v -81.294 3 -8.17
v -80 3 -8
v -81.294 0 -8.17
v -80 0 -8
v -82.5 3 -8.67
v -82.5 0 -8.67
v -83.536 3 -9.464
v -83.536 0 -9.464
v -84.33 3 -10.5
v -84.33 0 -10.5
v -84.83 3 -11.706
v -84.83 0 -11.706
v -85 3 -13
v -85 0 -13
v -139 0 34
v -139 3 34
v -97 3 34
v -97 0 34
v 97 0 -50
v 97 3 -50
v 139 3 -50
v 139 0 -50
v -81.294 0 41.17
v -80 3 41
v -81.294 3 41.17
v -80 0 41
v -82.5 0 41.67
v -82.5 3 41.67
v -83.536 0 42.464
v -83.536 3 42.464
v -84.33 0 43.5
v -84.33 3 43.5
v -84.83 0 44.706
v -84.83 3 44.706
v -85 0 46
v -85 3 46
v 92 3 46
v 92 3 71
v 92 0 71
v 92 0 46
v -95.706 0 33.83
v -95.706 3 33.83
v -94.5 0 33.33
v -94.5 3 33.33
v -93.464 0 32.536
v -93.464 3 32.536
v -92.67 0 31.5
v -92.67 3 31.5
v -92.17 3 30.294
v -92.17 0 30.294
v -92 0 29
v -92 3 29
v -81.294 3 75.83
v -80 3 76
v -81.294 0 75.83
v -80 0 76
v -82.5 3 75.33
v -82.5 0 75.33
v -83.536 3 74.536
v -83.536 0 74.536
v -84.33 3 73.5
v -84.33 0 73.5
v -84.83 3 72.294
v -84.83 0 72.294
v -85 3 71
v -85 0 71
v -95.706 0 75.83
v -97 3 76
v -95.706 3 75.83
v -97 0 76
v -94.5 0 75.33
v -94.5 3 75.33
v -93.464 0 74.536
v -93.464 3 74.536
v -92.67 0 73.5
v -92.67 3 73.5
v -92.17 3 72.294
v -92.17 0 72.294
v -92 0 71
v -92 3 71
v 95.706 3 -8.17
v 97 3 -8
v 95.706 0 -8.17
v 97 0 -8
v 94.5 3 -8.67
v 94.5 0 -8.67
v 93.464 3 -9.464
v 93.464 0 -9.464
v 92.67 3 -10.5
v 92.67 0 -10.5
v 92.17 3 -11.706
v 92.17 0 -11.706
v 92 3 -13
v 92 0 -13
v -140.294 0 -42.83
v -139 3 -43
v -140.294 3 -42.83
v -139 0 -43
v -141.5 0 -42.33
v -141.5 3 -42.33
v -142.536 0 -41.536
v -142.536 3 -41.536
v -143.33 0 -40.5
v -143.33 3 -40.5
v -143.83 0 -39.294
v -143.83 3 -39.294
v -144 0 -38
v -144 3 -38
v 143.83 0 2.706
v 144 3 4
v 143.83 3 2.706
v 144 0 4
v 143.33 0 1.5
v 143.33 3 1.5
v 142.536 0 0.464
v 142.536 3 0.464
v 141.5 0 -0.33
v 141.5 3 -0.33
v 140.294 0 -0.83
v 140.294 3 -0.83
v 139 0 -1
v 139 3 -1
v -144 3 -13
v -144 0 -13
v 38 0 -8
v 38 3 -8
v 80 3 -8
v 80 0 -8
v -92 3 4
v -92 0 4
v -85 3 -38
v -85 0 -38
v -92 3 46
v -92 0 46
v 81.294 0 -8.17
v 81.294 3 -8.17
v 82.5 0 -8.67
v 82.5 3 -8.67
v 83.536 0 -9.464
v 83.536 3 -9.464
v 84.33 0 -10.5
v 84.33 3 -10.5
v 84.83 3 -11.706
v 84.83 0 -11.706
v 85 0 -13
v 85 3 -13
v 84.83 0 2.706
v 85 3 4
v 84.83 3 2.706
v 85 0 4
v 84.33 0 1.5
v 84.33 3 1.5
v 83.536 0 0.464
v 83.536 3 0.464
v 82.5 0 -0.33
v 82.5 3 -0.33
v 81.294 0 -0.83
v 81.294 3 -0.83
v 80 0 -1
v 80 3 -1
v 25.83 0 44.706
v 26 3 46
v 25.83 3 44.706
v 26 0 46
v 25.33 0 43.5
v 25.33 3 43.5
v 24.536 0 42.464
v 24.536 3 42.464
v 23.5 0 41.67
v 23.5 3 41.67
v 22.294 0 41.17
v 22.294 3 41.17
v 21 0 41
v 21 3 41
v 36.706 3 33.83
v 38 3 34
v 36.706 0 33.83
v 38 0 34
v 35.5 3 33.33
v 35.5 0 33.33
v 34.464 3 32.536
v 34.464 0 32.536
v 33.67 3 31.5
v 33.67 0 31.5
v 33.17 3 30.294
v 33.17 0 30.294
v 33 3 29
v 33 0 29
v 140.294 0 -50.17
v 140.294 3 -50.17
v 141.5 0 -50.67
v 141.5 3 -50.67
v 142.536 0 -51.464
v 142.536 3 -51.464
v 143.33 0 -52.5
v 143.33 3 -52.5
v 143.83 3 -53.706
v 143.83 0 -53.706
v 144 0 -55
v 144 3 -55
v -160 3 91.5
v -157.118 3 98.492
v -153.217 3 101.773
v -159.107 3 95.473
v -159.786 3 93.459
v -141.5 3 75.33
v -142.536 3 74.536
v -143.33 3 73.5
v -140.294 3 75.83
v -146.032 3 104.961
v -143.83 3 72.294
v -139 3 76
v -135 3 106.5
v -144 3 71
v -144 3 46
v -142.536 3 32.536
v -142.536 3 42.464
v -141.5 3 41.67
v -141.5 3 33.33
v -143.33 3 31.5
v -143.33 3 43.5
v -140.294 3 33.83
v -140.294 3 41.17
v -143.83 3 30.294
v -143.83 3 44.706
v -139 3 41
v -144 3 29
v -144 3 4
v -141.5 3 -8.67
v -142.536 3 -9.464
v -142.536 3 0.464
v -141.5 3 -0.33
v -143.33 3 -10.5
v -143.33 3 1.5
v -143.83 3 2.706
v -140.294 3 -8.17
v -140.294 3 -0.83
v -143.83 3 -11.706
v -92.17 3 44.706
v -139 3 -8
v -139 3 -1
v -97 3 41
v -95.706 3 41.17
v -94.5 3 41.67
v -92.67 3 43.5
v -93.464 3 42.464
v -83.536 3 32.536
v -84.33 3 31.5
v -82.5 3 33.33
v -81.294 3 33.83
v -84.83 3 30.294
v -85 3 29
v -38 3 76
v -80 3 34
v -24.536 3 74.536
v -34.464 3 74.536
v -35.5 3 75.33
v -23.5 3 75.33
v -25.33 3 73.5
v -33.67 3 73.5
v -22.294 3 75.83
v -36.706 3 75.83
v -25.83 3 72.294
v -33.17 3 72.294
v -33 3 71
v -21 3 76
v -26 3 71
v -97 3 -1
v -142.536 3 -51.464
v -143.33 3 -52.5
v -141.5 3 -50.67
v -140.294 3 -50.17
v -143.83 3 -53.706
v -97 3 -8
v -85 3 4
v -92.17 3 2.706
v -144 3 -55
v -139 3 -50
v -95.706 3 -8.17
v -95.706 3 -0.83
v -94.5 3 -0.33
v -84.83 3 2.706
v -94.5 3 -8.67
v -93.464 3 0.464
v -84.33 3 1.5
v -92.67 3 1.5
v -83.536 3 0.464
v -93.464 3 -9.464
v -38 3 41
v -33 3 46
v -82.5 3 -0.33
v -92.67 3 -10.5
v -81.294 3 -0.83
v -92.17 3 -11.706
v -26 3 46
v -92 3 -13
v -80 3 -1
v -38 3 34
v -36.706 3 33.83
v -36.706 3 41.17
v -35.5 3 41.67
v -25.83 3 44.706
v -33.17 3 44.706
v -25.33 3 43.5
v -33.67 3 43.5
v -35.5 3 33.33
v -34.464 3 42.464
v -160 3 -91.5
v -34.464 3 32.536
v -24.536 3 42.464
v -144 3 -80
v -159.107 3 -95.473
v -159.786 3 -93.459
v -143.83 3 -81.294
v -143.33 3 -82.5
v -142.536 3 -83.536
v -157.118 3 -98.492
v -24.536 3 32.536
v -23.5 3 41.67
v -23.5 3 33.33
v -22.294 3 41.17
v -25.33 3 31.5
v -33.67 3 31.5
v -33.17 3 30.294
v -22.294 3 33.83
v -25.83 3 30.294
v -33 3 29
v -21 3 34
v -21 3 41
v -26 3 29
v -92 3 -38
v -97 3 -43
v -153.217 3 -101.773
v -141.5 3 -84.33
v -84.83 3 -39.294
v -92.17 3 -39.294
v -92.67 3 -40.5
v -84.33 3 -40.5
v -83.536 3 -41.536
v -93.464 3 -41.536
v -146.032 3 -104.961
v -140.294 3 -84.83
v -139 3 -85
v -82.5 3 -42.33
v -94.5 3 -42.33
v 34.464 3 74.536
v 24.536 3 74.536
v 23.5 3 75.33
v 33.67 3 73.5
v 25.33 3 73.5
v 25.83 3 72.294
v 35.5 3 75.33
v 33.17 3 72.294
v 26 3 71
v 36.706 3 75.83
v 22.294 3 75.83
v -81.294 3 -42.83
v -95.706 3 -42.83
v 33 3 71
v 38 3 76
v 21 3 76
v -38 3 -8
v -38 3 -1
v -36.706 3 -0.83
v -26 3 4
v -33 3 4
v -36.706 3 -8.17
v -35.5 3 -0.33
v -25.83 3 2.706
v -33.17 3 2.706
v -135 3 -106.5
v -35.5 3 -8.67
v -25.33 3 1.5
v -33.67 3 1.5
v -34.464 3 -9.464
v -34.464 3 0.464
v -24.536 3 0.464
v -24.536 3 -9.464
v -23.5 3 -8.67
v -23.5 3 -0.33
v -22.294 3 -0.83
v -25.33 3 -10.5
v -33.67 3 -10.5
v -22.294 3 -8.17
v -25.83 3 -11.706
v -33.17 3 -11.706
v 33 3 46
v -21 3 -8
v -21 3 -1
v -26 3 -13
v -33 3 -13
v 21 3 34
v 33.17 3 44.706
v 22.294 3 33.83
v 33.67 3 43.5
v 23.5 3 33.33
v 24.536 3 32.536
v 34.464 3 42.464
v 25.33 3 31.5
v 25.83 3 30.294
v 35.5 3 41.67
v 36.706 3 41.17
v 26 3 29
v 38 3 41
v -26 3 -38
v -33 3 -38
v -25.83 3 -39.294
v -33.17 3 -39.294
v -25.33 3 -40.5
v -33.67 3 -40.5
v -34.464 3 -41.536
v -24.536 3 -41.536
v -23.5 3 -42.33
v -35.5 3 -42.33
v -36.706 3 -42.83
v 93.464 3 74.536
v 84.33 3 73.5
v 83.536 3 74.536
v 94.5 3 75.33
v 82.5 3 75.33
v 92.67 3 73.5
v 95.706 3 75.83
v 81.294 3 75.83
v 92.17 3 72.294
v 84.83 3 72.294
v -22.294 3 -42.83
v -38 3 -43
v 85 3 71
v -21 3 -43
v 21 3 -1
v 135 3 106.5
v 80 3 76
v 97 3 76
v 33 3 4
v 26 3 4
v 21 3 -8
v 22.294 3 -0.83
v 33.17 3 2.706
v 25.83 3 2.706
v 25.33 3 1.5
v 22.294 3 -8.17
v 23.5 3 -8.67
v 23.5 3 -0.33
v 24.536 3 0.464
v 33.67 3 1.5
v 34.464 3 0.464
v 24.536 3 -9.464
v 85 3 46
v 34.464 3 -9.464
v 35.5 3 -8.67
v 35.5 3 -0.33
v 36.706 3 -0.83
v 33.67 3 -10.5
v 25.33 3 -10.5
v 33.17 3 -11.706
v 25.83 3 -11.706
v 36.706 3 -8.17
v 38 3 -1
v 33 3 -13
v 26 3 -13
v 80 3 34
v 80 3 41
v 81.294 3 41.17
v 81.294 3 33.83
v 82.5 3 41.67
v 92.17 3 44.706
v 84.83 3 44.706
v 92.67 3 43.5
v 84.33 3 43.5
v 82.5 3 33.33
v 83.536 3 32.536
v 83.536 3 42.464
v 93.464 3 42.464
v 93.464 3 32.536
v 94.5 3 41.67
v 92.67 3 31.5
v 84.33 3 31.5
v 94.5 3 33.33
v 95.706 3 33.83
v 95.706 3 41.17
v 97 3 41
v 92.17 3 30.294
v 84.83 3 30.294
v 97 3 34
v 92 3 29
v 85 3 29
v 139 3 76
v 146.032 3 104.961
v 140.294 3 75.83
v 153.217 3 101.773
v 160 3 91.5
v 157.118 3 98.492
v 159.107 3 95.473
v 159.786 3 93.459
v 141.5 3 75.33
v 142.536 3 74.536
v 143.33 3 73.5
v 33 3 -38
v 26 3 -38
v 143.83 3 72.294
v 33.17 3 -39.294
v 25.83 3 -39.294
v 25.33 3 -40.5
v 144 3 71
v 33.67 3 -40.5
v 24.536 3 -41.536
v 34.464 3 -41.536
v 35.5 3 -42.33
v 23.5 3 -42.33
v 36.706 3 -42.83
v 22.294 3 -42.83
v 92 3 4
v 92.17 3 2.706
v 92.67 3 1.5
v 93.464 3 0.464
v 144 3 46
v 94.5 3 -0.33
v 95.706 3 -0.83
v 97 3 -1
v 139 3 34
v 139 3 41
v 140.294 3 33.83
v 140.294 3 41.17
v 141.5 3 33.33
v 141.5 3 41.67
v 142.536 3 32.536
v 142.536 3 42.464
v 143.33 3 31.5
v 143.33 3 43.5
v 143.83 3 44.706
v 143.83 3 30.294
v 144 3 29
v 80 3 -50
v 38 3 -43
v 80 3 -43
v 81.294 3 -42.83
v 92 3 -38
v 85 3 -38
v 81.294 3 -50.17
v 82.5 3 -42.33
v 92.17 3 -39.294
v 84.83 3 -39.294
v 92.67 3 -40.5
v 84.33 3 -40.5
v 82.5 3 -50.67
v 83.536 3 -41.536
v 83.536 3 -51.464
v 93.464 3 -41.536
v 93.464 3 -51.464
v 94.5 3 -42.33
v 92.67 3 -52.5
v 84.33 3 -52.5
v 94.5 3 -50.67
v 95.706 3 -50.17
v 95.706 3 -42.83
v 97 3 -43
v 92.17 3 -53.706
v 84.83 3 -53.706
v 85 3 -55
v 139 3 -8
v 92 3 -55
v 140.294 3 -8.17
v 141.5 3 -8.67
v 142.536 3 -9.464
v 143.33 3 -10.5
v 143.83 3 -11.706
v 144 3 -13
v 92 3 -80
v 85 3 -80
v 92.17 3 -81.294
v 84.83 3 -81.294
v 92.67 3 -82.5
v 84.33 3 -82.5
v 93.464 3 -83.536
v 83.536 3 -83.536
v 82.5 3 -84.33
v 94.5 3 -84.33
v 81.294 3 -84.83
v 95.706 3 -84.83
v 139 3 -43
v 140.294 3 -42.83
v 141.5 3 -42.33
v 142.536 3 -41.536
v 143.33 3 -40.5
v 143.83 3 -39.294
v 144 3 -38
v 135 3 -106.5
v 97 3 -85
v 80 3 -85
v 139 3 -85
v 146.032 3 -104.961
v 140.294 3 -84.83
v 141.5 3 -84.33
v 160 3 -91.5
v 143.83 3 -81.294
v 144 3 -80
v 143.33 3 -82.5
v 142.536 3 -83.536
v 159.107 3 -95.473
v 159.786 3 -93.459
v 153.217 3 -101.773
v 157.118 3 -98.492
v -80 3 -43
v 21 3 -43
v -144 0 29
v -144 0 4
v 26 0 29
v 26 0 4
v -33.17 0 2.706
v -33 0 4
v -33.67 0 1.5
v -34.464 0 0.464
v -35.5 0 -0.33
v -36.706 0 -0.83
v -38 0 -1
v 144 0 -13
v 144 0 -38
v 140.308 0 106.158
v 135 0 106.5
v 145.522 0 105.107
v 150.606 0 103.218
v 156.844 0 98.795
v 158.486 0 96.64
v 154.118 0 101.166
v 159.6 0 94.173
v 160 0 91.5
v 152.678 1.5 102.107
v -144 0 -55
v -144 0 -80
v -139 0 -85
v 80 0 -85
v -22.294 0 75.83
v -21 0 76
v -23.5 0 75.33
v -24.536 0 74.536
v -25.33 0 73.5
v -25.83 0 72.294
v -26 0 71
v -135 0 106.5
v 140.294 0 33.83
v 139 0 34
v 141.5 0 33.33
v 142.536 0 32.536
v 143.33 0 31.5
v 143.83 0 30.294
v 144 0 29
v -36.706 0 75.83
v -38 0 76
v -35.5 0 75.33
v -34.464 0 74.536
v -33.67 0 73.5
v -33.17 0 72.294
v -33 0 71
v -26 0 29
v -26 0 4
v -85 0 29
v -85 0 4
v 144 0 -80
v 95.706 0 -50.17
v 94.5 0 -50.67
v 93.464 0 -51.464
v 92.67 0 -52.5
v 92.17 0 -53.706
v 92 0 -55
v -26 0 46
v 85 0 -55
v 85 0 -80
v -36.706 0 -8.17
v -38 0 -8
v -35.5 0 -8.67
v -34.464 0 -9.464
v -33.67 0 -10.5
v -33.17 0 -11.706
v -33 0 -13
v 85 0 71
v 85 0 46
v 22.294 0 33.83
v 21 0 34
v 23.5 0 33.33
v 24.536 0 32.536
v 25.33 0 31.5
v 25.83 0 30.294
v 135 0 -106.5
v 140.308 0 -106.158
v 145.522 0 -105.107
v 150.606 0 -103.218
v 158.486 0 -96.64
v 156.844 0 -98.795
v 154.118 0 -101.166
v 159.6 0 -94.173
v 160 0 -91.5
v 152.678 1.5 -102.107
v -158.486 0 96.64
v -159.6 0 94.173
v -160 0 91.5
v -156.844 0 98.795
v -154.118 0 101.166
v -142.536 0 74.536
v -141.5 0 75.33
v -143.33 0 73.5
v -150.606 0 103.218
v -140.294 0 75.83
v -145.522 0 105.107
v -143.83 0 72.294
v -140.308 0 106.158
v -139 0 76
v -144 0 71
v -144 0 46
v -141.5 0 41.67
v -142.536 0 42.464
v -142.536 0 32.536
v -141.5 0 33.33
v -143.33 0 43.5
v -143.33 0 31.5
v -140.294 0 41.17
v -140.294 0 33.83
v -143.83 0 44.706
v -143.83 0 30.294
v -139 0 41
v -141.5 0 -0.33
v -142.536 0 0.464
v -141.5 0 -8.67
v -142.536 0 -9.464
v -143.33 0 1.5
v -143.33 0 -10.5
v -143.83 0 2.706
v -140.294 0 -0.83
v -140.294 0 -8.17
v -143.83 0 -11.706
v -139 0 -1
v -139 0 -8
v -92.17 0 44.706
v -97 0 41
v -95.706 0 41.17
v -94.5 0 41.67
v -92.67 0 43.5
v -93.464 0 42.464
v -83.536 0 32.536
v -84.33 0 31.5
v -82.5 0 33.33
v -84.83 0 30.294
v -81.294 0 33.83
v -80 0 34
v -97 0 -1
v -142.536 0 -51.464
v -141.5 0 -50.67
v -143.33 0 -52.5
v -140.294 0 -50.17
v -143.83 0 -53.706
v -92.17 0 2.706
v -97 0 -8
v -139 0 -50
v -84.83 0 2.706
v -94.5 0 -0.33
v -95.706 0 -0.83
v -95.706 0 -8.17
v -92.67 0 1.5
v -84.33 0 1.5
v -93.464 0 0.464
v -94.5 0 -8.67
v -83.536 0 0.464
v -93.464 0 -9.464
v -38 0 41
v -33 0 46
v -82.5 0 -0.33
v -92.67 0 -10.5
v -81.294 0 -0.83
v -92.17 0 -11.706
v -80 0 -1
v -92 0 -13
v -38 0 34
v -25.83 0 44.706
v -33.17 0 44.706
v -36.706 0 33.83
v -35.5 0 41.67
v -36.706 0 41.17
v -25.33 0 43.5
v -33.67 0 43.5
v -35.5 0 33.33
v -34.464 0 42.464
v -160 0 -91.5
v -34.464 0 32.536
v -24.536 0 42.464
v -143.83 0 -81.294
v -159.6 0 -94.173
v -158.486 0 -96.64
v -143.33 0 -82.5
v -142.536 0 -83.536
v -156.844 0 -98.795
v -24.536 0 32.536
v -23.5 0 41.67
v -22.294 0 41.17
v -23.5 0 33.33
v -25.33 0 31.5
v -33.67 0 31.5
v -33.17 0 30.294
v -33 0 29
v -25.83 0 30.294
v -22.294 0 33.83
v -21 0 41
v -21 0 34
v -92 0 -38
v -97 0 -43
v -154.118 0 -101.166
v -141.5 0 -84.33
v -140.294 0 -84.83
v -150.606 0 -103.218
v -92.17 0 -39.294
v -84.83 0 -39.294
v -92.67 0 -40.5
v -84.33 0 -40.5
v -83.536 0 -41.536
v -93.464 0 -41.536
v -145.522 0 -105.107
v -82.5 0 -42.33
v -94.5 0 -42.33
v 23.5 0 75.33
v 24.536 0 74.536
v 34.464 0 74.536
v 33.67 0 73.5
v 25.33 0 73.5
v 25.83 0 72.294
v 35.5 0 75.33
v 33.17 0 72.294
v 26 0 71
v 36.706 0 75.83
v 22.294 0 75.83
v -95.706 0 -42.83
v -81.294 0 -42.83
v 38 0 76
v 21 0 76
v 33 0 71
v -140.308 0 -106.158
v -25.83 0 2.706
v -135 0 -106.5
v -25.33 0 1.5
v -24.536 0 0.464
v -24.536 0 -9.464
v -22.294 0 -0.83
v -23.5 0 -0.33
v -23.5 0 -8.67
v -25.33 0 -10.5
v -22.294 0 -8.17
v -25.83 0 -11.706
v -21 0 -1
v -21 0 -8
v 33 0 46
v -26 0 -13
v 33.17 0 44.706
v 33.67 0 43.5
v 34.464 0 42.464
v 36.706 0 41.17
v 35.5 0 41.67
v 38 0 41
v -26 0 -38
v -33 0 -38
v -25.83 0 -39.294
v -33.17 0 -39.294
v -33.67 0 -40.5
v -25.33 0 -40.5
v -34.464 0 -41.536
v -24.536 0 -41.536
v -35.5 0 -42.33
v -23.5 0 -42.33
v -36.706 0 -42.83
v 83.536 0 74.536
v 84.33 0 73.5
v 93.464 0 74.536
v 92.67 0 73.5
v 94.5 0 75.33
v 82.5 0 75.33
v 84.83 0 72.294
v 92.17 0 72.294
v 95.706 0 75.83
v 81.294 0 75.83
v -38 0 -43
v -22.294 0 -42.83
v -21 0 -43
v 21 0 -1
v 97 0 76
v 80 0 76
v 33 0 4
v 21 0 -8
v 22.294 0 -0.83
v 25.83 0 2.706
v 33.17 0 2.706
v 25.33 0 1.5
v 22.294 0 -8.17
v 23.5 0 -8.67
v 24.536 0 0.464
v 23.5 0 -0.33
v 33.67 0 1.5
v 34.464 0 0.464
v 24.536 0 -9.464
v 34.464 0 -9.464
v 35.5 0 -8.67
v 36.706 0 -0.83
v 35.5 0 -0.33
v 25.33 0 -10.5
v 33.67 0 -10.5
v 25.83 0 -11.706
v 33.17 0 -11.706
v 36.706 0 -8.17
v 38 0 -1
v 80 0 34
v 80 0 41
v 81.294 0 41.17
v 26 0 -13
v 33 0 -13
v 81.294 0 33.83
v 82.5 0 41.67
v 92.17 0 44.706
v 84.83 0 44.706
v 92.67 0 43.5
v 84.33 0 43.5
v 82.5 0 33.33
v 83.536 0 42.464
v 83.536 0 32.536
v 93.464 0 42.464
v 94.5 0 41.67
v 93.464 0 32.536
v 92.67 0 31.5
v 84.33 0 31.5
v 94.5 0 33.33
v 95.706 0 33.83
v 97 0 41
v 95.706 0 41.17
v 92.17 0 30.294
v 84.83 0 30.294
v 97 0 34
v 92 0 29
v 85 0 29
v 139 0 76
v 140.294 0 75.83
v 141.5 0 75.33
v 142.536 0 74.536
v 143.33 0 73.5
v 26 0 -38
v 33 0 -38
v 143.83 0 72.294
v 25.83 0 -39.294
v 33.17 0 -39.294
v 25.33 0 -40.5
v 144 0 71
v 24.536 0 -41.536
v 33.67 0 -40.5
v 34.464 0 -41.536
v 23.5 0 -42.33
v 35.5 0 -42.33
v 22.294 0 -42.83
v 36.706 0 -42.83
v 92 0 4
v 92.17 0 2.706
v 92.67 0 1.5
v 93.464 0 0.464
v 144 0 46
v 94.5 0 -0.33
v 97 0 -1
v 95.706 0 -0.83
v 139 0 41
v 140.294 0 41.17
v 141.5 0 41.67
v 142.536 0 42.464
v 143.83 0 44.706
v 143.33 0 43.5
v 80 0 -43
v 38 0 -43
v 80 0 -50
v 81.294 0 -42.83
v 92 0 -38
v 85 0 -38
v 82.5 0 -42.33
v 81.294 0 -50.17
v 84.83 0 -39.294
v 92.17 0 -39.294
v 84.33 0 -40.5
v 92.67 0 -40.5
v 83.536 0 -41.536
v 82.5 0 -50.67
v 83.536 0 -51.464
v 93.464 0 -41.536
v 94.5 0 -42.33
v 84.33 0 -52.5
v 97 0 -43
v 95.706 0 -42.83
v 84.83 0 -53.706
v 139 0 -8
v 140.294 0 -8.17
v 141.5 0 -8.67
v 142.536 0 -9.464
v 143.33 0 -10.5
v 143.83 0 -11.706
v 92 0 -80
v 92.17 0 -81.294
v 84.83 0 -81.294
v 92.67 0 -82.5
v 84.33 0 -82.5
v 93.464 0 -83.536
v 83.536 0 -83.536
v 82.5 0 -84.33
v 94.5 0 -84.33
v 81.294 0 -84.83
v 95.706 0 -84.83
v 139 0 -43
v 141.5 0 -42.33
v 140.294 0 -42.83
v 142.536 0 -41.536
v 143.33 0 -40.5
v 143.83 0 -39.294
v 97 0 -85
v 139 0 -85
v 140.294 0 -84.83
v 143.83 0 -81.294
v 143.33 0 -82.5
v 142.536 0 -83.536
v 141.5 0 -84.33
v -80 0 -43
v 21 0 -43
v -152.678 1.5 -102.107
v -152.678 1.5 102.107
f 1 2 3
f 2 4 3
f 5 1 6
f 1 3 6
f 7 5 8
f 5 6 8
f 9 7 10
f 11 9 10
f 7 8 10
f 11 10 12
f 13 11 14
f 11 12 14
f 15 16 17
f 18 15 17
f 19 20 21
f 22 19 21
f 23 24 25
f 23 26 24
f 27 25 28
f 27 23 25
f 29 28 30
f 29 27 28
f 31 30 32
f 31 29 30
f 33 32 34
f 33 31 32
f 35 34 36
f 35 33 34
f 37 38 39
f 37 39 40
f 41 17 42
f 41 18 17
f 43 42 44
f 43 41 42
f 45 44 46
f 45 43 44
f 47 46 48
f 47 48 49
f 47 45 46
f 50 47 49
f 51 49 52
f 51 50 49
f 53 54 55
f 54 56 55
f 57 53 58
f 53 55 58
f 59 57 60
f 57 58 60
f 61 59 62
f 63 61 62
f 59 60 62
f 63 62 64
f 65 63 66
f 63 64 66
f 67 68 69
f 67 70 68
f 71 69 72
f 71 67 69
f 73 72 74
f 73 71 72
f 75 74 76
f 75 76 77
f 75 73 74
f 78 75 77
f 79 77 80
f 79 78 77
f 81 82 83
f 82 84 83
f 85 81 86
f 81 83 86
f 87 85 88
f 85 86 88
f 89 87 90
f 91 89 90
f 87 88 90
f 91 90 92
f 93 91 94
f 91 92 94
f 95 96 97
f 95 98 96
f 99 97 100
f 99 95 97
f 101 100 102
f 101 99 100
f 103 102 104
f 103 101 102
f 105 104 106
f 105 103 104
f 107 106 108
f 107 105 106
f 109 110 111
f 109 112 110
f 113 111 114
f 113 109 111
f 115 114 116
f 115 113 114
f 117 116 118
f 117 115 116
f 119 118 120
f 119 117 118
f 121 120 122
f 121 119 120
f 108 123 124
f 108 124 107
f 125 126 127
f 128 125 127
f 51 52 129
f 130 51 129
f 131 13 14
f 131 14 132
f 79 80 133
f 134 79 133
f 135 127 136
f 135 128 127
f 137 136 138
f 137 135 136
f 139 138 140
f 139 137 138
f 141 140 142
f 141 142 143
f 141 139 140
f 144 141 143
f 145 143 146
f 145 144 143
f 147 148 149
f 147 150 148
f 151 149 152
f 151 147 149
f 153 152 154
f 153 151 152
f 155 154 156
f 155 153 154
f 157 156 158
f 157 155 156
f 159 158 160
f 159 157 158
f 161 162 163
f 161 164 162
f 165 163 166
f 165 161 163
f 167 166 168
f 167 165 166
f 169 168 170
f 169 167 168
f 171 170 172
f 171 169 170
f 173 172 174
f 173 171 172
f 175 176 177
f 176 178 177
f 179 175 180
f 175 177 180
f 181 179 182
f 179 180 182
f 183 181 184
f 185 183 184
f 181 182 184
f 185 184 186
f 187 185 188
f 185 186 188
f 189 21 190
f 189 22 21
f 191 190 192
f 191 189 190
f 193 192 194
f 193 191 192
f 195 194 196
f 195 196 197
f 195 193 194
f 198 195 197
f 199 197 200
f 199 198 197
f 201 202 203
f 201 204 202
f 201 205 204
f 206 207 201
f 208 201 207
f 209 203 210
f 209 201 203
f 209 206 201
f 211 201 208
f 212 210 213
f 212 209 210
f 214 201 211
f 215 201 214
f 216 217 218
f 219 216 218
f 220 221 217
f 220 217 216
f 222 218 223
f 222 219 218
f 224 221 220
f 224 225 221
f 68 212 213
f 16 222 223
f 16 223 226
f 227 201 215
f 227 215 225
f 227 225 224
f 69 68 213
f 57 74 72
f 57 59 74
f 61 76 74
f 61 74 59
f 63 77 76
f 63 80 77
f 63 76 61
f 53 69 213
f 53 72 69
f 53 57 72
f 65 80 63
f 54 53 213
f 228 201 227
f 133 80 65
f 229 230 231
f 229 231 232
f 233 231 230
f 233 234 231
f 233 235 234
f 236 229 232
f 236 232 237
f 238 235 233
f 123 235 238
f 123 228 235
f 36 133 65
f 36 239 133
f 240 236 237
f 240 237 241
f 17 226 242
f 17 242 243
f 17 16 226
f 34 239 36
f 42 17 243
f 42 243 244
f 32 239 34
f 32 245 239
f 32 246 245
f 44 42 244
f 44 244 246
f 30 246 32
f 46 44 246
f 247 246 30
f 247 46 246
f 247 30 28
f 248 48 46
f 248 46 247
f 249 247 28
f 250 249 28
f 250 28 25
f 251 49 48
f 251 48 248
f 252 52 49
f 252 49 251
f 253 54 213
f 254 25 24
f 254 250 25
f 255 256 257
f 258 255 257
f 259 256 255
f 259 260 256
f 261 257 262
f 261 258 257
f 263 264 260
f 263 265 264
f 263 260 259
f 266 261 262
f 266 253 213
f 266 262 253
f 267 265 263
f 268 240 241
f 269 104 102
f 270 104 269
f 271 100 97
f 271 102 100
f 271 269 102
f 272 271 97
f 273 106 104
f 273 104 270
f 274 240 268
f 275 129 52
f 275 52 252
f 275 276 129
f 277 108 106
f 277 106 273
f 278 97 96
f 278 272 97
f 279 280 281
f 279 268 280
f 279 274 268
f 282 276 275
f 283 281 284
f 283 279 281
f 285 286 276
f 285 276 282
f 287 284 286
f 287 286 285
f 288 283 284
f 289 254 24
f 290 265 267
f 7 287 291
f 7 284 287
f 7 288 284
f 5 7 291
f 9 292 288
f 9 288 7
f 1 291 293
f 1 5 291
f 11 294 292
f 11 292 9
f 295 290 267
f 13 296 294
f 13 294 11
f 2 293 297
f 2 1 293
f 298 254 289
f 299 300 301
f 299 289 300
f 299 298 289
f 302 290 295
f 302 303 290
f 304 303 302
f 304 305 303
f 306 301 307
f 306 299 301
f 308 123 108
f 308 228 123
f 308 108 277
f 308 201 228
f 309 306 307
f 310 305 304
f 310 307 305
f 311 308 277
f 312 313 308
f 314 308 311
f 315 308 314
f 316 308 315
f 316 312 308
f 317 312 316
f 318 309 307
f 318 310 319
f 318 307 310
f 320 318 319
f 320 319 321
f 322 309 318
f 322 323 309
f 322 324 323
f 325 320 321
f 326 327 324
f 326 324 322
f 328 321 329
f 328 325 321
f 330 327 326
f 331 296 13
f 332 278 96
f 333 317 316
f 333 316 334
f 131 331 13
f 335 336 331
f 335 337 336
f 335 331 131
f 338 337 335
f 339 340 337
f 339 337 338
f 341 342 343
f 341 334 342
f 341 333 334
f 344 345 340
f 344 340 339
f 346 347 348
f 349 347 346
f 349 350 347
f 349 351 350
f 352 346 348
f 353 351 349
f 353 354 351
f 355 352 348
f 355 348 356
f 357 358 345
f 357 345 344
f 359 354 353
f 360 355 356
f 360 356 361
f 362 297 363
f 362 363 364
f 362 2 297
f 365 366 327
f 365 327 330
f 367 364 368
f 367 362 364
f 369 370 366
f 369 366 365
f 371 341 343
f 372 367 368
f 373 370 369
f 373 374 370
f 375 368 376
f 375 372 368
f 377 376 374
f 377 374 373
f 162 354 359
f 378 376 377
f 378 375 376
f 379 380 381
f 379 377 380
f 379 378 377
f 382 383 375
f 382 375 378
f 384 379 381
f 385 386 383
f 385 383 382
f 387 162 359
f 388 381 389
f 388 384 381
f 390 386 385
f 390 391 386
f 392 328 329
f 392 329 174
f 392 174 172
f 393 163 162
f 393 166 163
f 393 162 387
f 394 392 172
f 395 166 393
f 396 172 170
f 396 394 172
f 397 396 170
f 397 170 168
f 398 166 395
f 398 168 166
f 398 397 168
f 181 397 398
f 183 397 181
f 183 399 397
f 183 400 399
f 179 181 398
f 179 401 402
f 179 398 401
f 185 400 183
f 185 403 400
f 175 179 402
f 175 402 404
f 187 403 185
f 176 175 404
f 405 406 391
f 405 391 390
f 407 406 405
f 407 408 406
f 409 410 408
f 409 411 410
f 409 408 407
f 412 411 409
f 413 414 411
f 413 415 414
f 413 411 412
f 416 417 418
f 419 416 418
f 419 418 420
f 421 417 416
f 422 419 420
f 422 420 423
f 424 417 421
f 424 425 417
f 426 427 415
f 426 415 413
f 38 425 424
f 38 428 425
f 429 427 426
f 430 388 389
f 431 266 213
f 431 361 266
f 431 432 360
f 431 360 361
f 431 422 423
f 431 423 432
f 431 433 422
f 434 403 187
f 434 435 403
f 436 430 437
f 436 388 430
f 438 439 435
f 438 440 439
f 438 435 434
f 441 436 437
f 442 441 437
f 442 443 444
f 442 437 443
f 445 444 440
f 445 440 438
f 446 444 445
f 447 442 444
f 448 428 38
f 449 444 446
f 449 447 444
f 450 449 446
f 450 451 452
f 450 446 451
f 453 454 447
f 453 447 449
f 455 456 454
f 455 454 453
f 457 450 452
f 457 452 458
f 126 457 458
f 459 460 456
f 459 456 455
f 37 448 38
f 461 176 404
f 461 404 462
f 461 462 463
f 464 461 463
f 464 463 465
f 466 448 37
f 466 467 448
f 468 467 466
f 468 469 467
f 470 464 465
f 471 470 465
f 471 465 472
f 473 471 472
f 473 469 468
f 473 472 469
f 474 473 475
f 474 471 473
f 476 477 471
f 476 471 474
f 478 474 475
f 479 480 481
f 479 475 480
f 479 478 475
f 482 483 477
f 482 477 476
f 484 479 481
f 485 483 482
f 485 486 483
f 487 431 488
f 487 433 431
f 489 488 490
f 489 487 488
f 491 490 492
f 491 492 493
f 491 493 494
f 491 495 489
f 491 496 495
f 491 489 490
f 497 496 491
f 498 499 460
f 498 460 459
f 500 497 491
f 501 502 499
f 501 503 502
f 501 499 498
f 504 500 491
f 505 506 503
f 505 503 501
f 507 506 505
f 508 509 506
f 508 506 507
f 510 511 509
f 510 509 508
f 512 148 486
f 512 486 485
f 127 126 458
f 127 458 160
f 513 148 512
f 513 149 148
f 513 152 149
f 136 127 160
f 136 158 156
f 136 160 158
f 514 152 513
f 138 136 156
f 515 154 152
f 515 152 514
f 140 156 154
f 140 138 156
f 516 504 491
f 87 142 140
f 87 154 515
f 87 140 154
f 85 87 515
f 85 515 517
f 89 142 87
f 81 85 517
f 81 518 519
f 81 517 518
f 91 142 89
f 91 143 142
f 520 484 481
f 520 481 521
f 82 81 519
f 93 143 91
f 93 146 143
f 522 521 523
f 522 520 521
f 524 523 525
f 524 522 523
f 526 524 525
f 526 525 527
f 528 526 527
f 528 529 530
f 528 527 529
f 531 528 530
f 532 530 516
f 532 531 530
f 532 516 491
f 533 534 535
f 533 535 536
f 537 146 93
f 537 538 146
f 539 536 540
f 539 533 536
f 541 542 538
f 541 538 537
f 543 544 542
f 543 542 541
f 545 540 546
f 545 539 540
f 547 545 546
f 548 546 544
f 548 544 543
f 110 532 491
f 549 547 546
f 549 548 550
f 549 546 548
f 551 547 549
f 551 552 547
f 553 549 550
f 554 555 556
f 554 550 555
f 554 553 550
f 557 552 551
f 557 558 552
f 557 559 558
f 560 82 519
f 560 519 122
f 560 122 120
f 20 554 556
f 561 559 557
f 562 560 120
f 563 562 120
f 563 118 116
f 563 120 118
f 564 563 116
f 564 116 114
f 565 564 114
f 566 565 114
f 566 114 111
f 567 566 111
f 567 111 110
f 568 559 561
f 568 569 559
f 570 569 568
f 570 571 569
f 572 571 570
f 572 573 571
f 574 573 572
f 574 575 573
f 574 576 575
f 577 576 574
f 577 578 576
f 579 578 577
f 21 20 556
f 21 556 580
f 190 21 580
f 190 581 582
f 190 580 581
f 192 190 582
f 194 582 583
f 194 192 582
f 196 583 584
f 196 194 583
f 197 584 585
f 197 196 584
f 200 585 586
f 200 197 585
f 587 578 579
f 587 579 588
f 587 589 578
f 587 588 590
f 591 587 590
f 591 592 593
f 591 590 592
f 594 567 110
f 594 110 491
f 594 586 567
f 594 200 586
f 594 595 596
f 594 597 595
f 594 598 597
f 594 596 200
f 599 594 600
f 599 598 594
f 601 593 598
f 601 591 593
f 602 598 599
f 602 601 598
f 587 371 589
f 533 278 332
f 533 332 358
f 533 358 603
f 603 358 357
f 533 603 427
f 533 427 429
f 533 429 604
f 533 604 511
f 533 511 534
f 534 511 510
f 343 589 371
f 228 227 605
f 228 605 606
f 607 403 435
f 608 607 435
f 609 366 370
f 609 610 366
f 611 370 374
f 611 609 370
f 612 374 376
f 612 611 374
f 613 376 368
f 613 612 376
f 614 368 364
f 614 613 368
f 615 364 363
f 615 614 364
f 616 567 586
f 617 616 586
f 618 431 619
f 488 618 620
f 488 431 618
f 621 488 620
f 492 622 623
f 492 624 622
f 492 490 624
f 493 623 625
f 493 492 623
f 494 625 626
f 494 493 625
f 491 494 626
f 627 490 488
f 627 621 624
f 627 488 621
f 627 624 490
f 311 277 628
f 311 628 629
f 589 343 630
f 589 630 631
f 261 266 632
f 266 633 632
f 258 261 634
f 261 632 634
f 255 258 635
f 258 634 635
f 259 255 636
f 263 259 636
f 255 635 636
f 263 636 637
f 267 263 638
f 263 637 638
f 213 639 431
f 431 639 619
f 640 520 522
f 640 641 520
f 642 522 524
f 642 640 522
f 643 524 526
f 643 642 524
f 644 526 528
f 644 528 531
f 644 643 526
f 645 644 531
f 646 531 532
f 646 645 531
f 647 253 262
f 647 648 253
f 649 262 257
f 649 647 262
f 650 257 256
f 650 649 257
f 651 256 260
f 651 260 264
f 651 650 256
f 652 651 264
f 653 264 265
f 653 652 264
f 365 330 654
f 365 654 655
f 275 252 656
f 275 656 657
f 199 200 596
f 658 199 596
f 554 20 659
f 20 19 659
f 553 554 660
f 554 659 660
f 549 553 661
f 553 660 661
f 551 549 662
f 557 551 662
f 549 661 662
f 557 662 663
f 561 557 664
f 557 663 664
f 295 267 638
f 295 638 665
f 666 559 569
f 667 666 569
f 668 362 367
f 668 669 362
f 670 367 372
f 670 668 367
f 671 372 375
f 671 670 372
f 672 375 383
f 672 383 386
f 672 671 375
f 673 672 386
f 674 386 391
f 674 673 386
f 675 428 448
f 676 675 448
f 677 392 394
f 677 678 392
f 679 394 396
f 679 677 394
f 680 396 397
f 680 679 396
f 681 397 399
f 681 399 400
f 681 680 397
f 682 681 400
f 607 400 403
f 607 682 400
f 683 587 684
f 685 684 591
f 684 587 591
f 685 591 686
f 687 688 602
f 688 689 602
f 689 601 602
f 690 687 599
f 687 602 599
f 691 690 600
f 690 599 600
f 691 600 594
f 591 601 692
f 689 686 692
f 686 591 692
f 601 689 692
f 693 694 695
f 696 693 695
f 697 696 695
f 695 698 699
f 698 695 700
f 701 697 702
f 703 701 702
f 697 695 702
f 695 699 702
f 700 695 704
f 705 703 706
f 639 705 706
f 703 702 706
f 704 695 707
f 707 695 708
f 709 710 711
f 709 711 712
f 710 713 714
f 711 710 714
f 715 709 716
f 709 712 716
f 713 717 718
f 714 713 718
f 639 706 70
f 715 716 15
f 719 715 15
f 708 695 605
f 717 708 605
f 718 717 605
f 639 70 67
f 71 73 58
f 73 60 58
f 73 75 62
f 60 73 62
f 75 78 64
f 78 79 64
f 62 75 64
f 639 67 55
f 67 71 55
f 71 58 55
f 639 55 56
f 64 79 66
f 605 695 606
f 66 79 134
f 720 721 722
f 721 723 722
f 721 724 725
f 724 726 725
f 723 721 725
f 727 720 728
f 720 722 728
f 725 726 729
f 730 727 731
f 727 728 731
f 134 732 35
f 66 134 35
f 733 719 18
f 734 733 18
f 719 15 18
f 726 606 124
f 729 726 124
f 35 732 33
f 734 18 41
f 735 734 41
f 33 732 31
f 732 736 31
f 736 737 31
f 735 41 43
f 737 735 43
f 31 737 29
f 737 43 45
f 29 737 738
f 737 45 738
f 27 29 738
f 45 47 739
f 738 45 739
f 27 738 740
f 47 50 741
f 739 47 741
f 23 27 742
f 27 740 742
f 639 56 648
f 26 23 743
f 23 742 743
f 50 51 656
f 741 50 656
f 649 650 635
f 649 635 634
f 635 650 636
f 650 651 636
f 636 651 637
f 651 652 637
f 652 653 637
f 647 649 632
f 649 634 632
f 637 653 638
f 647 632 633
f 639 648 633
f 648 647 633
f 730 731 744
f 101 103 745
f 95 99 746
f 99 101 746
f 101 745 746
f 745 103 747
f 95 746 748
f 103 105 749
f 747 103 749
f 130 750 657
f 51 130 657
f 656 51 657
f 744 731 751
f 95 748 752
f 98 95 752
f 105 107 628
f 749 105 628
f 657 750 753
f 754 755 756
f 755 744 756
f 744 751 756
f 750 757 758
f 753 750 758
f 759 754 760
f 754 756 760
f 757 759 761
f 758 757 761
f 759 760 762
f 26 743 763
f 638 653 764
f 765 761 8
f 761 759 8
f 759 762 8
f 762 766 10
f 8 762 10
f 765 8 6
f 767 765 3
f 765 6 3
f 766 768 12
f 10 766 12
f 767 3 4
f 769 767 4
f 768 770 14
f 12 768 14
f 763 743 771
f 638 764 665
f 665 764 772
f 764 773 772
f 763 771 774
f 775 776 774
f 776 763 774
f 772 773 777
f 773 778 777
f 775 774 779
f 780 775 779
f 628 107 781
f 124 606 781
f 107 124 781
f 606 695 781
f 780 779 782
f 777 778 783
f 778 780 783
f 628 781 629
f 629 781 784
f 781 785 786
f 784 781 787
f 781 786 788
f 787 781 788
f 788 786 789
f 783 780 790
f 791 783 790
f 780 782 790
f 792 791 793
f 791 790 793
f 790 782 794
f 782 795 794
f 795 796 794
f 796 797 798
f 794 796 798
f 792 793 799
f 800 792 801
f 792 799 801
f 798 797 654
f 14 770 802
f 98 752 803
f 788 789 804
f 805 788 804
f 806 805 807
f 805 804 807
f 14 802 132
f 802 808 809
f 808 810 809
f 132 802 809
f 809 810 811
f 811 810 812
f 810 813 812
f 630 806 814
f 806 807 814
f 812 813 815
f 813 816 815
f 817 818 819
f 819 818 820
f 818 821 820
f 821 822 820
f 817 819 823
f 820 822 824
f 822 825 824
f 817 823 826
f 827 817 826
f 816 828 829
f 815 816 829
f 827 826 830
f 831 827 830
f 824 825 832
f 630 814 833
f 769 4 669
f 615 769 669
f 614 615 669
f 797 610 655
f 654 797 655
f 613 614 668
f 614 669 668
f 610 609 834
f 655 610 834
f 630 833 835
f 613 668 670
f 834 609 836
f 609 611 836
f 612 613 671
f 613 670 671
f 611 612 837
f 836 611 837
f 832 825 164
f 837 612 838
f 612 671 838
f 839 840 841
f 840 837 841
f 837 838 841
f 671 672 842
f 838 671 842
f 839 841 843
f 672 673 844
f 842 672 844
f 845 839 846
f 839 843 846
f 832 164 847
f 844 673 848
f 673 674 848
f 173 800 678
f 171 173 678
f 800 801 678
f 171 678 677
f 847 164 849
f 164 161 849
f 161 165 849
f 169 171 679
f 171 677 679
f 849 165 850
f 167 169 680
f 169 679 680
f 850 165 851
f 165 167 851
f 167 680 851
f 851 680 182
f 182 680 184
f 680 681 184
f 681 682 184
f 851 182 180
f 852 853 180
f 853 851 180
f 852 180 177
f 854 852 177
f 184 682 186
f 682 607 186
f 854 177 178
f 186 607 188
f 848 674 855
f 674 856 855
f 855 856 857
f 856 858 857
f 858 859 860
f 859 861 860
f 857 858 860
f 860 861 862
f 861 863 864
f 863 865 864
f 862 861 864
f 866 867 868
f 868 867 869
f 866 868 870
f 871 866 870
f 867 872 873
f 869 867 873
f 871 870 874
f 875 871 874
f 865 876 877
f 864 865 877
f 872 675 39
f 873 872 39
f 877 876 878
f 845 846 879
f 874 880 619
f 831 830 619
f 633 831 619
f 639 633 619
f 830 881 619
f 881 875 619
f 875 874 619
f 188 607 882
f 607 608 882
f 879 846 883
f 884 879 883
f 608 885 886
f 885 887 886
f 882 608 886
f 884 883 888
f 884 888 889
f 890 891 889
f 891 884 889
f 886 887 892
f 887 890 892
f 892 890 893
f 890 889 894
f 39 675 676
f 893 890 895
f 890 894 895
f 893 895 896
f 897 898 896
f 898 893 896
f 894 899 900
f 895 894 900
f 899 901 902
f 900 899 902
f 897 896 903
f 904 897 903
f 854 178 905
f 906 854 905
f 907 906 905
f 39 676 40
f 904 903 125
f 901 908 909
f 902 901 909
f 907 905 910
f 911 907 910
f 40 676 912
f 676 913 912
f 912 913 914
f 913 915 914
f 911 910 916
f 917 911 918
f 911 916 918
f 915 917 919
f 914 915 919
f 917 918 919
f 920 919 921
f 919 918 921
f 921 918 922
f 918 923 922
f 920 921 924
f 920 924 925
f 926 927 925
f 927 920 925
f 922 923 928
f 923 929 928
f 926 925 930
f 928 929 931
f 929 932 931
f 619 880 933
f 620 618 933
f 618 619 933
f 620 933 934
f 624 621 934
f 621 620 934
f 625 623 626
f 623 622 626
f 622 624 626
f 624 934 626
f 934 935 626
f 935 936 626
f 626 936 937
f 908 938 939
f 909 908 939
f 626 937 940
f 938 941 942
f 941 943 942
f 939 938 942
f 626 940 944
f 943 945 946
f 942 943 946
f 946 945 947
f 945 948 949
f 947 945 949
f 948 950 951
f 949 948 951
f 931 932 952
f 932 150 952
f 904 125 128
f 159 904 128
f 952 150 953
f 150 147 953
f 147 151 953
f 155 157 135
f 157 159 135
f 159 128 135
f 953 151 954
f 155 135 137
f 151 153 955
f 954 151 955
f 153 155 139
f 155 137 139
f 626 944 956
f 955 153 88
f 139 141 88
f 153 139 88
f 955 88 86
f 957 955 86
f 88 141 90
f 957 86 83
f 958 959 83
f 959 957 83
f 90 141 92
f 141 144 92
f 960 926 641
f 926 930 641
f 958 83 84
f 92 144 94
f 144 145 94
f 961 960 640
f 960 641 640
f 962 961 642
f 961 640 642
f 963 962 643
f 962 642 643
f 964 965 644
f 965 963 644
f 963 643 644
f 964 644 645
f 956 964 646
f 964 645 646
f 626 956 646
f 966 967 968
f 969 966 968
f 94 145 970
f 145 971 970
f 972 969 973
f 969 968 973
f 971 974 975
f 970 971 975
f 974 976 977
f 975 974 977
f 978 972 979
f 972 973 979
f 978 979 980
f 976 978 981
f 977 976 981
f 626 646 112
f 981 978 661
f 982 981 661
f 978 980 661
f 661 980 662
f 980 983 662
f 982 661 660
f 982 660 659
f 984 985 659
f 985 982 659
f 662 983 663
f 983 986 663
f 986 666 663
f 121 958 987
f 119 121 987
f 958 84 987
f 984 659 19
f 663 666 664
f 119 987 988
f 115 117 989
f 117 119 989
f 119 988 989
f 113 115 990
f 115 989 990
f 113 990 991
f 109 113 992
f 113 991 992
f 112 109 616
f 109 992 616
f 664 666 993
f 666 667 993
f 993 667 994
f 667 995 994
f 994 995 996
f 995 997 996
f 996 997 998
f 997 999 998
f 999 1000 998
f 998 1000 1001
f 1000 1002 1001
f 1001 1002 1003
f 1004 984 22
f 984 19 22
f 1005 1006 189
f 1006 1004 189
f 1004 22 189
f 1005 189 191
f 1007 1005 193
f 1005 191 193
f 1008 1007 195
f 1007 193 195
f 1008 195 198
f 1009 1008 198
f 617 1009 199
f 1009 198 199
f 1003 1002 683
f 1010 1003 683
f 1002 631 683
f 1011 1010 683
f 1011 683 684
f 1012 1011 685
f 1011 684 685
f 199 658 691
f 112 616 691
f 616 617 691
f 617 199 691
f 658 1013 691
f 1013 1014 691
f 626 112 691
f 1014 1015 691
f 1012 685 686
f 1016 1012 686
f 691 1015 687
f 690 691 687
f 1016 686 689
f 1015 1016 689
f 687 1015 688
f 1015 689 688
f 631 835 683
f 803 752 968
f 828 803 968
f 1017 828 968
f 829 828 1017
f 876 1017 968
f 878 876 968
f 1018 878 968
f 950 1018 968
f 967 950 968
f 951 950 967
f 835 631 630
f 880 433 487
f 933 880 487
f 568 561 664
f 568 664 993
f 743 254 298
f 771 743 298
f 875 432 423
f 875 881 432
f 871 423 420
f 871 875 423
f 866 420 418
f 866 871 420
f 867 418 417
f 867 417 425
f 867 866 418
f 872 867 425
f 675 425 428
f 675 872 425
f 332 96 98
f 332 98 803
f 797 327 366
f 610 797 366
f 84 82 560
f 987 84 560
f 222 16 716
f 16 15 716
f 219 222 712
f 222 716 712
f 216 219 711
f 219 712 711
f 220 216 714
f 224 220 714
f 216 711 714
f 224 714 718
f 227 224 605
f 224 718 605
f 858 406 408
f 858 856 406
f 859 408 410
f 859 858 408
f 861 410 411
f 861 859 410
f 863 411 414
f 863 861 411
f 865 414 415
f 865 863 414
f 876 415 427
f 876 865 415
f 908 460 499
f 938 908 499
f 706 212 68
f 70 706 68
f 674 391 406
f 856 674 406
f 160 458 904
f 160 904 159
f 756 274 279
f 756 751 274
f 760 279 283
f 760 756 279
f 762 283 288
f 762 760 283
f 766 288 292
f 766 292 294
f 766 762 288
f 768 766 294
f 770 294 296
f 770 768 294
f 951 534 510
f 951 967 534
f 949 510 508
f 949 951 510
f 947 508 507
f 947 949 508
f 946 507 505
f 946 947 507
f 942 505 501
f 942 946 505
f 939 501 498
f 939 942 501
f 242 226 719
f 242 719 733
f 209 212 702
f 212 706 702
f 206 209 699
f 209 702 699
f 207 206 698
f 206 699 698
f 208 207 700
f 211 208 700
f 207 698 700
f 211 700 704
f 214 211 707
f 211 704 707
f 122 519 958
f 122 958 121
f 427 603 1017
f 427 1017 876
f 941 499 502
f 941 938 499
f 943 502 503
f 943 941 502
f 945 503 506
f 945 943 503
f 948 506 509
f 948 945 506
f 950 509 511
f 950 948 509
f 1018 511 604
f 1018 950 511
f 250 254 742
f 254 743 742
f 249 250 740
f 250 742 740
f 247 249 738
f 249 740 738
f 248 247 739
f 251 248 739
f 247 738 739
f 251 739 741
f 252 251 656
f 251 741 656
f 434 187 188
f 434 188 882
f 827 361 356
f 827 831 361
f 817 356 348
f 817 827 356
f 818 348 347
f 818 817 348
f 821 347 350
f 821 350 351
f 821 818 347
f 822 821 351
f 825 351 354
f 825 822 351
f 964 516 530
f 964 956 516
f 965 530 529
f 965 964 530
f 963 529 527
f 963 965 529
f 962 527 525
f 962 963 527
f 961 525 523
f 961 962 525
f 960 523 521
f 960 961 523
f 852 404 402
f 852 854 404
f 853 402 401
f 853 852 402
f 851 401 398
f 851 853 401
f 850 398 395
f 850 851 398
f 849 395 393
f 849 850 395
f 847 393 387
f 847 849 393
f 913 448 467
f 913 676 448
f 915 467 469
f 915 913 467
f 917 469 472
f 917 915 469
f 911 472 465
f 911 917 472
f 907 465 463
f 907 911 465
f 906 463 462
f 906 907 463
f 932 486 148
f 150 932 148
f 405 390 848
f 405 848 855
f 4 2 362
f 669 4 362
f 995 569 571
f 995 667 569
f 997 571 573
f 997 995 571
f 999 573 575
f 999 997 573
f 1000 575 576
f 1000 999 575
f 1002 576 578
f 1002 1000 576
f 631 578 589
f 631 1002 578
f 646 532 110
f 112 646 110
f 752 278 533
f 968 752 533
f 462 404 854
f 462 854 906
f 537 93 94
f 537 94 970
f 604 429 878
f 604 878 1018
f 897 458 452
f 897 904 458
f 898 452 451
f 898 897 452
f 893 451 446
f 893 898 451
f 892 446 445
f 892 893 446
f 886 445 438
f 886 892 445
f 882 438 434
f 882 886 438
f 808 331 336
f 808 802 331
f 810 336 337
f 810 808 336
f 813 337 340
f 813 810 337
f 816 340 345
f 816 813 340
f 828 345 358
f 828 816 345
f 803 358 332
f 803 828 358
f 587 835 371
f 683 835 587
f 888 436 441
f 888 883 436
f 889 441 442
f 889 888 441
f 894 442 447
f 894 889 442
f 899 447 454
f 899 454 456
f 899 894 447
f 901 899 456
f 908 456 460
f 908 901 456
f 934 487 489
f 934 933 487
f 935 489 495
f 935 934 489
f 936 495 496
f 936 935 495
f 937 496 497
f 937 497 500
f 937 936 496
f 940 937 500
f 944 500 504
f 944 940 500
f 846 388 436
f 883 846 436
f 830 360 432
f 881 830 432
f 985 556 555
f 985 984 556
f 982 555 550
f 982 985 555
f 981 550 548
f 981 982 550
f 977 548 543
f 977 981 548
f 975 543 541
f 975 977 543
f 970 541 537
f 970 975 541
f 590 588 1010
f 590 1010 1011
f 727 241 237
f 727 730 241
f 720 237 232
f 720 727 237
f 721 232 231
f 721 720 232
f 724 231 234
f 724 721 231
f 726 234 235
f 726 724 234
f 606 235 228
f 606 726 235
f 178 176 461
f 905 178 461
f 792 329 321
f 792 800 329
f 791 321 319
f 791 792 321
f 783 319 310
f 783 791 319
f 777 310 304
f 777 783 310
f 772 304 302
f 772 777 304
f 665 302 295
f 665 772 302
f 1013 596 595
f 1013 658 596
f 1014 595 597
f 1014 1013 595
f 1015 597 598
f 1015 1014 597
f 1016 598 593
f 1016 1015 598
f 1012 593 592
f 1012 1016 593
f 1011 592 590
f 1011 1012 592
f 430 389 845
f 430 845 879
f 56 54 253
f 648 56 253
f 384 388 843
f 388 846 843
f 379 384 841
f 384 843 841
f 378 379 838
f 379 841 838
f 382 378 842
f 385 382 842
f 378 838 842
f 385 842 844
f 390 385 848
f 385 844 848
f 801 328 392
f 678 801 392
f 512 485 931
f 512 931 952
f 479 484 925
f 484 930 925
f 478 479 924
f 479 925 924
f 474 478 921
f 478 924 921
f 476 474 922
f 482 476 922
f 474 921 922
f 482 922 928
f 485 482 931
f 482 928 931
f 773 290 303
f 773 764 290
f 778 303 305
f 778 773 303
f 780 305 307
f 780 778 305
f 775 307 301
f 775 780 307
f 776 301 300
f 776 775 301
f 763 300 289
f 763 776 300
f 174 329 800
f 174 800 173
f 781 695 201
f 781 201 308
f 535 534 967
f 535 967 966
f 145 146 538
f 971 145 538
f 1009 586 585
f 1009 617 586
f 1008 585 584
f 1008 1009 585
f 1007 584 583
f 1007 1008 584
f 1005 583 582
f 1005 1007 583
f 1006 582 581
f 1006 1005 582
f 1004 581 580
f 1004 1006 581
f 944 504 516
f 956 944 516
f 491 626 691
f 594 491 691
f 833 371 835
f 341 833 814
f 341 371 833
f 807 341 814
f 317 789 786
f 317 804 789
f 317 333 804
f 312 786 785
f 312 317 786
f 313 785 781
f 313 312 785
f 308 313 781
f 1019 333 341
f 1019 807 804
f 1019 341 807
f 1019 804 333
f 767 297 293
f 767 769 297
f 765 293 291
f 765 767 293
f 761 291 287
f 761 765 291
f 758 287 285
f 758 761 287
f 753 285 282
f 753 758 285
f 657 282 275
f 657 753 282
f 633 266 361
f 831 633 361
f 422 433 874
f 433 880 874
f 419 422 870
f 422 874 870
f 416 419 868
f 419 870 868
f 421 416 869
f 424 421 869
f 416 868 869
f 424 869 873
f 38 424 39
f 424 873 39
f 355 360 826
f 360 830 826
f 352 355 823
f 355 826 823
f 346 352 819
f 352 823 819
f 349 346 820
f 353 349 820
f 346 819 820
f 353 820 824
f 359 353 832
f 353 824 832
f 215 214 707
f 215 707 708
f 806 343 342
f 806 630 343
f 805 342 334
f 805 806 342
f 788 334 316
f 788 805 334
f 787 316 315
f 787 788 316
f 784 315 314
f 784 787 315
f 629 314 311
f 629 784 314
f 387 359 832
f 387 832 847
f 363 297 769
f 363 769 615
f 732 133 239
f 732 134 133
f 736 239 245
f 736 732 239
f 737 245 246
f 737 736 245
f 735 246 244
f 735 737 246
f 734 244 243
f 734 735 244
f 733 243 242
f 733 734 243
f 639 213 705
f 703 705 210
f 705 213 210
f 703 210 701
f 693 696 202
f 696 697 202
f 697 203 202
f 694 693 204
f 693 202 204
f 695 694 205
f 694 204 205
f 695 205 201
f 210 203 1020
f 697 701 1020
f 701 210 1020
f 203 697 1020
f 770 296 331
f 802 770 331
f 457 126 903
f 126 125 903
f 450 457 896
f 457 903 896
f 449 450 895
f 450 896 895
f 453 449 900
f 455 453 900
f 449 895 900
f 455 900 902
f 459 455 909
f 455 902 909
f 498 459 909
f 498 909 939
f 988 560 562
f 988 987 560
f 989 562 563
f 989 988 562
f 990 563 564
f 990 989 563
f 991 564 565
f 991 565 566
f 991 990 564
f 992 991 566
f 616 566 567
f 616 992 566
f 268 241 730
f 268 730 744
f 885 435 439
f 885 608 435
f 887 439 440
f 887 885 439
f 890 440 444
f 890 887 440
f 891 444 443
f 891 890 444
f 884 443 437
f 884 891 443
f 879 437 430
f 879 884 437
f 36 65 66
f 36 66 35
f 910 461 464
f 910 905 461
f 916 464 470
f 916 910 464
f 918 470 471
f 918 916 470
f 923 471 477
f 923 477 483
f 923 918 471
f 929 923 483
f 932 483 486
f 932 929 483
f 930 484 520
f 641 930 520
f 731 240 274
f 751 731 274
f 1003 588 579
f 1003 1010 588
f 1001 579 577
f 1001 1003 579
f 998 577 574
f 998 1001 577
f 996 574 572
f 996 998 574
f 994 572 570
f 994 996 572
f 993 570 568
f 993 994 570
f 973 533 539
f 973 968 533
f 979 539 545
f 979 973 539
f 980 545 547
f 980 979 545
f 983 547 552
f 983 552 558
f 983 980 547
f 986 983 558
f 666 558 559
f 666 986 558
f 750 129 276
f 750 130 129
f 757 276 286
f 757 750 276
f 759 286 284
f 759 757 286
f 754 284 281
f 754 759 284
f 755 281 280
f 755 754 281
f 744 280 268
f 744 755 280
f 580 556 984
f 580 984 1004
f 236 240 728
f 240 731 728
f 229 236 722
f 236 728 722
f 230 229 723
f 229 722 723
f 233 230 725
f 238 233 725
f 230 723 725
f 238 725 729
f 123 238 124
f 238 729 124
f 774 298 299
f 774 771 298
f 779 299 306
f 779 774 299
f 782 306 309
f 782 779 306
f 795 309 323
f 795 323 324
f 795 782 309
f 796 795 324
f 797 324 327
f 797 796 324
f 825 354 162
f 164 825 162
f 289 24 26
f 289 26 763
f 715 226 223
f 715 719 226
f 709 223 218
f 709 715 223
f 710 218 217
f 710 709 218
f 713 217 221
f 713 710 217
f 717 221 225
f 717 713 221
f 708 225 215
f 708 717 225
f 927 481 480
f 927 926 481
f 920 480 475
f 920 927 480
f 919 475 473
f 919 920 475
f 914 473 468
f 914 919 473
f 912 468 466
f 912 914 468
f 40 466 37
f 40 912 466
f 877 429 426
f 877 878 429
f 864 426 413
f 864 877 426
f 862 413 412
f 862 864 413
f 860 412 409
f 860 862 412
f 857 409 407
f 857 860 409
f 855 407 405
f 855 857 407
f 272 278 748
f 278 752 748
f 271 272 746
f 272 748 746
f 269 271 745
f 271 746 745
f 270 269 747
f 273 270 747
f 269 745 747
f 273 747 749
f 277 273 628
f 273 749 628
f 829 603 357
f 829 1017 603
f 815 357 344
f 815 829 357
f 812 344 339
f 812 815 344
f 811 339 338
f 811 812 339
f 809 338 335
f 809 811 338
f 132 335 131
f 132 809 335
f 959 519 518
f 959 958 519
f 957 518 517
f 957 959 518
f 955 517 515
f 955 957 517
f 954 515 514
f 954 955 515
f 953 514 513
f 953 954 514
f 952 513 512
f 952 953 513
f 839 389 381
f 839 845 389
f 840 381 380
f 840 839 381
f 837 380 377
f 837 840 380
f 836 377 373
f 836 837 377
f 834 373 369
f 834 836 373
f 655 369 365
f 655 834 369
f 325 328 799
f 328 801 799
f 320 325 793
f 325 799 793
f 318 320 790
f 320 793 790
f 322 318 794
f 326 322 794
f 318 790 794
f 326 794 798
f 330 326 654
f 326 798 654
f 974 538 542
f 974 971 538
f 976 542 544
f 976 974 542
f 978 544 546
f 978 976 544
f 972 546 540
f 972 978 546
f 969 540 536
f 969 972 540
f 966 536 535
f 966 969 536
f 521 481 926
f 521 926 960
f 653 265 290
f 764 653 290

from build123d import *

# Parameters (mm, degrees)
SKETCH1_W                 = 320
SKETCH1_H                 = 213
OUTER_PROFILE_DEPTH       = 3
SKETCH5_W                 = 52
SKETCH5_H                 = 35
CUTOUT_DEPTH              = 193.227079258
CORNER_RAD_R              = 5
LPATTERN1_COUNT           = 5
LPATTERN1_PITCH           = 59
LPATTERN1_COUNT_DIR2      = 4
LPATTERN1_PITCH_DIR2      = 42
CORNER_RAD_OF_LPATTERN1_R = 5
CORNER_DEPTH              = 193.227079258
CORNERSB_COPY_1_DEPTH     = 193.227079258
SKETCH7_W                 = 135
SKETCH7_H                 = 35
CUT_EXTRUDE2_DEPTH        = 193.227079398


with BuildPart() as part:
    # Sketch1 → Outer Profile (new body)
    with BuildSketch(Plane(origin=(0, 0, 0), x_dir=(1, 0, 0), z_dir=(0, 1, 0))):
        Rectangle(SKETCH1_W, SKETCH1_H)
    extrude(amount=OUTER_PROFILE_DEPTH)

    # Sketch5 → Cutout (cut, through all)
    with BuildSketch(Plane(origin=(0, 3, 0), x_dir=(1, 0, 0), z_dir=(0, 1, 0))):
        with Locations((-118, -58.5)):
            Rectangle(SKETCH5_W, SKETCH5_H)
    cutout = extrude(amount=-CUTOUT_DEPTH, mode=Mode.SUBTRACT)

    # Corner Rad
    corner_rad_edges = [part.edges().sort_by_distance(p)[0] for p in [
        (-144, 1.5, 76),
        (-144, 1.5, 41),
        (-92, 1.5, 41),
        (-92, 1.5, 76),
    ]]
    fillet(corner_rad_edges, radius=CORNER_RAD_R)

    # LPattern1: Cutout 5 × 4
    with Locations(*[(i * LPATTERN1_PITCH, 0, -j * LPATTERN1_PITCH_DIR2) for i in range(LPATTERN1_COUNT) for j in range(LPATTERN1_COUNT_DIR2) if (i, j) != (0, 0)]):
        add(cutout, mode=Mode.SUBTRACT)

    # Corner Rad of LPattern1
    corner_rad_of_lpattern1_edges = [part.edges().sort_by_distance(p)[0] for p in [
        (-144, 1.5, 34),
        (-144, 1.5, -1),
        (-92, 1.5, -1),
        (-92, 1.5, 34),
        (-144, 1.5, -8),
        (-144, 1.5, -43),
        (-92, 1.5, -43),
        (-92, 1.5, -8),
        (-144, 1.5, -50),
        (-144, 1.5, -85),
        (-92, 1.5, -85),
        (-92, 1.5, -50),
        (-85, 1.5, 76),
        (-85, 1.5, 41),
        (-33, 1.5, 41),
        (-33, 1.5, 76),
        (-85, 1.5, 34),
        (-85, 1.5, -1),
        (-33, 1.5, -1),
        (-33, 1.5, 34),
        (-85, 1.5, -8),
        (-85, 1.5, -43),
        (-33, 1.5, -43),
        (-33, 1.5, -8),
        (-85, 1.5, -50),
        (-85, 1.5, -85),
        (-33, 1.5, -85),
        (-33, 1.5, -50),
        (-26, 1.5, 76),
        (-26, 1.5, 41),
        (26, 1.5, 41),
        (26, 1.5, 76),
        (-26, 1.5, 34),
        (-26, 1.5, -1),
        (26, 1.5, -1),
        (26, 1.5, 34),
        (-26, 1.5, -8),
        (-26, 1.5, -43),
        (26, 1.5, -43),
        (26, 1.5, -8),
        (-26, 1.5, -50),
        (-26, 1.5, -85),
        (26, 1.5, -85),
        (26, 1.5, -50),
        (33, 1.5, 76),
        (33, 1.5, 41),
        (85, 1.5, 41),
        (85, 1.5, 76),
        (33, 1.5, 34),
        (33, 1.5, -1),
        (85, 1.5, -1),
        (85, 1.5, 34),
        (33, 1.5, -8),
        (33, 1.5, -43),
        (85, 1.5, -43),
        (85, 1.5, -8),
        (33, 1.5, -50),
        (33, 1.5, -85),
        (85, 1.5, -85),
        (85, 1.5, -50),
        (92, 1.5, 76),
        (92, 1.5, 41),
        (144, 1.5, 41),
        (144, 1.5, 76),
        (92, 1.5, 34),
        (92, 1.5, -1),
        (144, 1.5, -1),
        (144, 1.5, 34),
        (92, 1.5, -8),
        (92, 1.5, -43),
        (144, 1.5, -43),
        (144, 1.5, -8),
        (92, 1.5, -50),
        (92, 1.5, -85),
        (144, 1.5, -85),
        (144, 1.5, -50),
    ]]
    fillet(corner_rad_of_lpattern1_edges, radius=CORNER_RAD_OF_LPATTERN1_R)

    # Sketch6 → Corner (cut, through all)
    with BuildSketch(Plane(origin=(0, 3, 0), x_dir=(1, 0, 0), z_dir=(0, 1, 0))):
        with BuildLine():
            Line((-135, 106.5), (-160, 106.5))
            Line((-160, 106.5), (-160, 91.5))
            add(Edge.make_bspline(
                [(-135, 106.5), (-160, 106.5), (-160, 91.5)],
                knots=[1.570796327, 1.570796327, 1.570796327, 3.141592654, 3.141592654, 3.141592654], degree=2, weights=[1, 0.707106781, 1]))
        make_face()
    corner = extrude(amount=-CORNER_DEPTH, mode=Mode.SUBTRACT)

    # CornersA: Corner across plane
    add(corner.mirror(Plane(origin=(0, 0, 0), x_dir=(0, 0, 1), z_dir=(1, 0, 0))), mode=Mode.SUBTRACT)

    # CornersB: Corner across plane
    add(corner.mirror(Plane.XY), mode=Mode.SUBTRACT)

    # CornersB copy 1 sketch → CornersB copy 1 (cut, through all)
    with BuildSketch(Plane(origin=(0, 3, 0), x_dir=(-1, 0, 0), z_dir=(0, 1, 0))):
        with BuildLine():
            Line((-135, 106.5), (-160, 106.5))
            Line((-160, 106.5), (-160, 91.5))
            add(Edge.make_bspline(
                [(-135, 106.5), (-160, 106.5), (-160, 91.5)],
                knots=[1.570796327, 1.570796327, 1.570796327, 3.141592654, 3.141592654, 3.141592654], degree=2, weights=[1, 0.707106781, 1]))
        make_face()
    extrude(amount=-CORNERSB_COPY_1_DEPTH, mode=Mode.SUBTRACT)

    # Sketch7 → Cut-Extrude2 (cut, through all)
    with BuildSketch(Plane(origin=(0, 3, 0), x_dir=(1, 0, 0), z_dir=(0, 1, 0))):
        with Locations((-29.5, 67.5)):
            Rectangle(SKETCH7_W, SKETCH7_H)
    extrude(amount=-CUT_EXTRUDE2_DEPTH, mode=Mode.SUBTRACT)


solid = part.part
